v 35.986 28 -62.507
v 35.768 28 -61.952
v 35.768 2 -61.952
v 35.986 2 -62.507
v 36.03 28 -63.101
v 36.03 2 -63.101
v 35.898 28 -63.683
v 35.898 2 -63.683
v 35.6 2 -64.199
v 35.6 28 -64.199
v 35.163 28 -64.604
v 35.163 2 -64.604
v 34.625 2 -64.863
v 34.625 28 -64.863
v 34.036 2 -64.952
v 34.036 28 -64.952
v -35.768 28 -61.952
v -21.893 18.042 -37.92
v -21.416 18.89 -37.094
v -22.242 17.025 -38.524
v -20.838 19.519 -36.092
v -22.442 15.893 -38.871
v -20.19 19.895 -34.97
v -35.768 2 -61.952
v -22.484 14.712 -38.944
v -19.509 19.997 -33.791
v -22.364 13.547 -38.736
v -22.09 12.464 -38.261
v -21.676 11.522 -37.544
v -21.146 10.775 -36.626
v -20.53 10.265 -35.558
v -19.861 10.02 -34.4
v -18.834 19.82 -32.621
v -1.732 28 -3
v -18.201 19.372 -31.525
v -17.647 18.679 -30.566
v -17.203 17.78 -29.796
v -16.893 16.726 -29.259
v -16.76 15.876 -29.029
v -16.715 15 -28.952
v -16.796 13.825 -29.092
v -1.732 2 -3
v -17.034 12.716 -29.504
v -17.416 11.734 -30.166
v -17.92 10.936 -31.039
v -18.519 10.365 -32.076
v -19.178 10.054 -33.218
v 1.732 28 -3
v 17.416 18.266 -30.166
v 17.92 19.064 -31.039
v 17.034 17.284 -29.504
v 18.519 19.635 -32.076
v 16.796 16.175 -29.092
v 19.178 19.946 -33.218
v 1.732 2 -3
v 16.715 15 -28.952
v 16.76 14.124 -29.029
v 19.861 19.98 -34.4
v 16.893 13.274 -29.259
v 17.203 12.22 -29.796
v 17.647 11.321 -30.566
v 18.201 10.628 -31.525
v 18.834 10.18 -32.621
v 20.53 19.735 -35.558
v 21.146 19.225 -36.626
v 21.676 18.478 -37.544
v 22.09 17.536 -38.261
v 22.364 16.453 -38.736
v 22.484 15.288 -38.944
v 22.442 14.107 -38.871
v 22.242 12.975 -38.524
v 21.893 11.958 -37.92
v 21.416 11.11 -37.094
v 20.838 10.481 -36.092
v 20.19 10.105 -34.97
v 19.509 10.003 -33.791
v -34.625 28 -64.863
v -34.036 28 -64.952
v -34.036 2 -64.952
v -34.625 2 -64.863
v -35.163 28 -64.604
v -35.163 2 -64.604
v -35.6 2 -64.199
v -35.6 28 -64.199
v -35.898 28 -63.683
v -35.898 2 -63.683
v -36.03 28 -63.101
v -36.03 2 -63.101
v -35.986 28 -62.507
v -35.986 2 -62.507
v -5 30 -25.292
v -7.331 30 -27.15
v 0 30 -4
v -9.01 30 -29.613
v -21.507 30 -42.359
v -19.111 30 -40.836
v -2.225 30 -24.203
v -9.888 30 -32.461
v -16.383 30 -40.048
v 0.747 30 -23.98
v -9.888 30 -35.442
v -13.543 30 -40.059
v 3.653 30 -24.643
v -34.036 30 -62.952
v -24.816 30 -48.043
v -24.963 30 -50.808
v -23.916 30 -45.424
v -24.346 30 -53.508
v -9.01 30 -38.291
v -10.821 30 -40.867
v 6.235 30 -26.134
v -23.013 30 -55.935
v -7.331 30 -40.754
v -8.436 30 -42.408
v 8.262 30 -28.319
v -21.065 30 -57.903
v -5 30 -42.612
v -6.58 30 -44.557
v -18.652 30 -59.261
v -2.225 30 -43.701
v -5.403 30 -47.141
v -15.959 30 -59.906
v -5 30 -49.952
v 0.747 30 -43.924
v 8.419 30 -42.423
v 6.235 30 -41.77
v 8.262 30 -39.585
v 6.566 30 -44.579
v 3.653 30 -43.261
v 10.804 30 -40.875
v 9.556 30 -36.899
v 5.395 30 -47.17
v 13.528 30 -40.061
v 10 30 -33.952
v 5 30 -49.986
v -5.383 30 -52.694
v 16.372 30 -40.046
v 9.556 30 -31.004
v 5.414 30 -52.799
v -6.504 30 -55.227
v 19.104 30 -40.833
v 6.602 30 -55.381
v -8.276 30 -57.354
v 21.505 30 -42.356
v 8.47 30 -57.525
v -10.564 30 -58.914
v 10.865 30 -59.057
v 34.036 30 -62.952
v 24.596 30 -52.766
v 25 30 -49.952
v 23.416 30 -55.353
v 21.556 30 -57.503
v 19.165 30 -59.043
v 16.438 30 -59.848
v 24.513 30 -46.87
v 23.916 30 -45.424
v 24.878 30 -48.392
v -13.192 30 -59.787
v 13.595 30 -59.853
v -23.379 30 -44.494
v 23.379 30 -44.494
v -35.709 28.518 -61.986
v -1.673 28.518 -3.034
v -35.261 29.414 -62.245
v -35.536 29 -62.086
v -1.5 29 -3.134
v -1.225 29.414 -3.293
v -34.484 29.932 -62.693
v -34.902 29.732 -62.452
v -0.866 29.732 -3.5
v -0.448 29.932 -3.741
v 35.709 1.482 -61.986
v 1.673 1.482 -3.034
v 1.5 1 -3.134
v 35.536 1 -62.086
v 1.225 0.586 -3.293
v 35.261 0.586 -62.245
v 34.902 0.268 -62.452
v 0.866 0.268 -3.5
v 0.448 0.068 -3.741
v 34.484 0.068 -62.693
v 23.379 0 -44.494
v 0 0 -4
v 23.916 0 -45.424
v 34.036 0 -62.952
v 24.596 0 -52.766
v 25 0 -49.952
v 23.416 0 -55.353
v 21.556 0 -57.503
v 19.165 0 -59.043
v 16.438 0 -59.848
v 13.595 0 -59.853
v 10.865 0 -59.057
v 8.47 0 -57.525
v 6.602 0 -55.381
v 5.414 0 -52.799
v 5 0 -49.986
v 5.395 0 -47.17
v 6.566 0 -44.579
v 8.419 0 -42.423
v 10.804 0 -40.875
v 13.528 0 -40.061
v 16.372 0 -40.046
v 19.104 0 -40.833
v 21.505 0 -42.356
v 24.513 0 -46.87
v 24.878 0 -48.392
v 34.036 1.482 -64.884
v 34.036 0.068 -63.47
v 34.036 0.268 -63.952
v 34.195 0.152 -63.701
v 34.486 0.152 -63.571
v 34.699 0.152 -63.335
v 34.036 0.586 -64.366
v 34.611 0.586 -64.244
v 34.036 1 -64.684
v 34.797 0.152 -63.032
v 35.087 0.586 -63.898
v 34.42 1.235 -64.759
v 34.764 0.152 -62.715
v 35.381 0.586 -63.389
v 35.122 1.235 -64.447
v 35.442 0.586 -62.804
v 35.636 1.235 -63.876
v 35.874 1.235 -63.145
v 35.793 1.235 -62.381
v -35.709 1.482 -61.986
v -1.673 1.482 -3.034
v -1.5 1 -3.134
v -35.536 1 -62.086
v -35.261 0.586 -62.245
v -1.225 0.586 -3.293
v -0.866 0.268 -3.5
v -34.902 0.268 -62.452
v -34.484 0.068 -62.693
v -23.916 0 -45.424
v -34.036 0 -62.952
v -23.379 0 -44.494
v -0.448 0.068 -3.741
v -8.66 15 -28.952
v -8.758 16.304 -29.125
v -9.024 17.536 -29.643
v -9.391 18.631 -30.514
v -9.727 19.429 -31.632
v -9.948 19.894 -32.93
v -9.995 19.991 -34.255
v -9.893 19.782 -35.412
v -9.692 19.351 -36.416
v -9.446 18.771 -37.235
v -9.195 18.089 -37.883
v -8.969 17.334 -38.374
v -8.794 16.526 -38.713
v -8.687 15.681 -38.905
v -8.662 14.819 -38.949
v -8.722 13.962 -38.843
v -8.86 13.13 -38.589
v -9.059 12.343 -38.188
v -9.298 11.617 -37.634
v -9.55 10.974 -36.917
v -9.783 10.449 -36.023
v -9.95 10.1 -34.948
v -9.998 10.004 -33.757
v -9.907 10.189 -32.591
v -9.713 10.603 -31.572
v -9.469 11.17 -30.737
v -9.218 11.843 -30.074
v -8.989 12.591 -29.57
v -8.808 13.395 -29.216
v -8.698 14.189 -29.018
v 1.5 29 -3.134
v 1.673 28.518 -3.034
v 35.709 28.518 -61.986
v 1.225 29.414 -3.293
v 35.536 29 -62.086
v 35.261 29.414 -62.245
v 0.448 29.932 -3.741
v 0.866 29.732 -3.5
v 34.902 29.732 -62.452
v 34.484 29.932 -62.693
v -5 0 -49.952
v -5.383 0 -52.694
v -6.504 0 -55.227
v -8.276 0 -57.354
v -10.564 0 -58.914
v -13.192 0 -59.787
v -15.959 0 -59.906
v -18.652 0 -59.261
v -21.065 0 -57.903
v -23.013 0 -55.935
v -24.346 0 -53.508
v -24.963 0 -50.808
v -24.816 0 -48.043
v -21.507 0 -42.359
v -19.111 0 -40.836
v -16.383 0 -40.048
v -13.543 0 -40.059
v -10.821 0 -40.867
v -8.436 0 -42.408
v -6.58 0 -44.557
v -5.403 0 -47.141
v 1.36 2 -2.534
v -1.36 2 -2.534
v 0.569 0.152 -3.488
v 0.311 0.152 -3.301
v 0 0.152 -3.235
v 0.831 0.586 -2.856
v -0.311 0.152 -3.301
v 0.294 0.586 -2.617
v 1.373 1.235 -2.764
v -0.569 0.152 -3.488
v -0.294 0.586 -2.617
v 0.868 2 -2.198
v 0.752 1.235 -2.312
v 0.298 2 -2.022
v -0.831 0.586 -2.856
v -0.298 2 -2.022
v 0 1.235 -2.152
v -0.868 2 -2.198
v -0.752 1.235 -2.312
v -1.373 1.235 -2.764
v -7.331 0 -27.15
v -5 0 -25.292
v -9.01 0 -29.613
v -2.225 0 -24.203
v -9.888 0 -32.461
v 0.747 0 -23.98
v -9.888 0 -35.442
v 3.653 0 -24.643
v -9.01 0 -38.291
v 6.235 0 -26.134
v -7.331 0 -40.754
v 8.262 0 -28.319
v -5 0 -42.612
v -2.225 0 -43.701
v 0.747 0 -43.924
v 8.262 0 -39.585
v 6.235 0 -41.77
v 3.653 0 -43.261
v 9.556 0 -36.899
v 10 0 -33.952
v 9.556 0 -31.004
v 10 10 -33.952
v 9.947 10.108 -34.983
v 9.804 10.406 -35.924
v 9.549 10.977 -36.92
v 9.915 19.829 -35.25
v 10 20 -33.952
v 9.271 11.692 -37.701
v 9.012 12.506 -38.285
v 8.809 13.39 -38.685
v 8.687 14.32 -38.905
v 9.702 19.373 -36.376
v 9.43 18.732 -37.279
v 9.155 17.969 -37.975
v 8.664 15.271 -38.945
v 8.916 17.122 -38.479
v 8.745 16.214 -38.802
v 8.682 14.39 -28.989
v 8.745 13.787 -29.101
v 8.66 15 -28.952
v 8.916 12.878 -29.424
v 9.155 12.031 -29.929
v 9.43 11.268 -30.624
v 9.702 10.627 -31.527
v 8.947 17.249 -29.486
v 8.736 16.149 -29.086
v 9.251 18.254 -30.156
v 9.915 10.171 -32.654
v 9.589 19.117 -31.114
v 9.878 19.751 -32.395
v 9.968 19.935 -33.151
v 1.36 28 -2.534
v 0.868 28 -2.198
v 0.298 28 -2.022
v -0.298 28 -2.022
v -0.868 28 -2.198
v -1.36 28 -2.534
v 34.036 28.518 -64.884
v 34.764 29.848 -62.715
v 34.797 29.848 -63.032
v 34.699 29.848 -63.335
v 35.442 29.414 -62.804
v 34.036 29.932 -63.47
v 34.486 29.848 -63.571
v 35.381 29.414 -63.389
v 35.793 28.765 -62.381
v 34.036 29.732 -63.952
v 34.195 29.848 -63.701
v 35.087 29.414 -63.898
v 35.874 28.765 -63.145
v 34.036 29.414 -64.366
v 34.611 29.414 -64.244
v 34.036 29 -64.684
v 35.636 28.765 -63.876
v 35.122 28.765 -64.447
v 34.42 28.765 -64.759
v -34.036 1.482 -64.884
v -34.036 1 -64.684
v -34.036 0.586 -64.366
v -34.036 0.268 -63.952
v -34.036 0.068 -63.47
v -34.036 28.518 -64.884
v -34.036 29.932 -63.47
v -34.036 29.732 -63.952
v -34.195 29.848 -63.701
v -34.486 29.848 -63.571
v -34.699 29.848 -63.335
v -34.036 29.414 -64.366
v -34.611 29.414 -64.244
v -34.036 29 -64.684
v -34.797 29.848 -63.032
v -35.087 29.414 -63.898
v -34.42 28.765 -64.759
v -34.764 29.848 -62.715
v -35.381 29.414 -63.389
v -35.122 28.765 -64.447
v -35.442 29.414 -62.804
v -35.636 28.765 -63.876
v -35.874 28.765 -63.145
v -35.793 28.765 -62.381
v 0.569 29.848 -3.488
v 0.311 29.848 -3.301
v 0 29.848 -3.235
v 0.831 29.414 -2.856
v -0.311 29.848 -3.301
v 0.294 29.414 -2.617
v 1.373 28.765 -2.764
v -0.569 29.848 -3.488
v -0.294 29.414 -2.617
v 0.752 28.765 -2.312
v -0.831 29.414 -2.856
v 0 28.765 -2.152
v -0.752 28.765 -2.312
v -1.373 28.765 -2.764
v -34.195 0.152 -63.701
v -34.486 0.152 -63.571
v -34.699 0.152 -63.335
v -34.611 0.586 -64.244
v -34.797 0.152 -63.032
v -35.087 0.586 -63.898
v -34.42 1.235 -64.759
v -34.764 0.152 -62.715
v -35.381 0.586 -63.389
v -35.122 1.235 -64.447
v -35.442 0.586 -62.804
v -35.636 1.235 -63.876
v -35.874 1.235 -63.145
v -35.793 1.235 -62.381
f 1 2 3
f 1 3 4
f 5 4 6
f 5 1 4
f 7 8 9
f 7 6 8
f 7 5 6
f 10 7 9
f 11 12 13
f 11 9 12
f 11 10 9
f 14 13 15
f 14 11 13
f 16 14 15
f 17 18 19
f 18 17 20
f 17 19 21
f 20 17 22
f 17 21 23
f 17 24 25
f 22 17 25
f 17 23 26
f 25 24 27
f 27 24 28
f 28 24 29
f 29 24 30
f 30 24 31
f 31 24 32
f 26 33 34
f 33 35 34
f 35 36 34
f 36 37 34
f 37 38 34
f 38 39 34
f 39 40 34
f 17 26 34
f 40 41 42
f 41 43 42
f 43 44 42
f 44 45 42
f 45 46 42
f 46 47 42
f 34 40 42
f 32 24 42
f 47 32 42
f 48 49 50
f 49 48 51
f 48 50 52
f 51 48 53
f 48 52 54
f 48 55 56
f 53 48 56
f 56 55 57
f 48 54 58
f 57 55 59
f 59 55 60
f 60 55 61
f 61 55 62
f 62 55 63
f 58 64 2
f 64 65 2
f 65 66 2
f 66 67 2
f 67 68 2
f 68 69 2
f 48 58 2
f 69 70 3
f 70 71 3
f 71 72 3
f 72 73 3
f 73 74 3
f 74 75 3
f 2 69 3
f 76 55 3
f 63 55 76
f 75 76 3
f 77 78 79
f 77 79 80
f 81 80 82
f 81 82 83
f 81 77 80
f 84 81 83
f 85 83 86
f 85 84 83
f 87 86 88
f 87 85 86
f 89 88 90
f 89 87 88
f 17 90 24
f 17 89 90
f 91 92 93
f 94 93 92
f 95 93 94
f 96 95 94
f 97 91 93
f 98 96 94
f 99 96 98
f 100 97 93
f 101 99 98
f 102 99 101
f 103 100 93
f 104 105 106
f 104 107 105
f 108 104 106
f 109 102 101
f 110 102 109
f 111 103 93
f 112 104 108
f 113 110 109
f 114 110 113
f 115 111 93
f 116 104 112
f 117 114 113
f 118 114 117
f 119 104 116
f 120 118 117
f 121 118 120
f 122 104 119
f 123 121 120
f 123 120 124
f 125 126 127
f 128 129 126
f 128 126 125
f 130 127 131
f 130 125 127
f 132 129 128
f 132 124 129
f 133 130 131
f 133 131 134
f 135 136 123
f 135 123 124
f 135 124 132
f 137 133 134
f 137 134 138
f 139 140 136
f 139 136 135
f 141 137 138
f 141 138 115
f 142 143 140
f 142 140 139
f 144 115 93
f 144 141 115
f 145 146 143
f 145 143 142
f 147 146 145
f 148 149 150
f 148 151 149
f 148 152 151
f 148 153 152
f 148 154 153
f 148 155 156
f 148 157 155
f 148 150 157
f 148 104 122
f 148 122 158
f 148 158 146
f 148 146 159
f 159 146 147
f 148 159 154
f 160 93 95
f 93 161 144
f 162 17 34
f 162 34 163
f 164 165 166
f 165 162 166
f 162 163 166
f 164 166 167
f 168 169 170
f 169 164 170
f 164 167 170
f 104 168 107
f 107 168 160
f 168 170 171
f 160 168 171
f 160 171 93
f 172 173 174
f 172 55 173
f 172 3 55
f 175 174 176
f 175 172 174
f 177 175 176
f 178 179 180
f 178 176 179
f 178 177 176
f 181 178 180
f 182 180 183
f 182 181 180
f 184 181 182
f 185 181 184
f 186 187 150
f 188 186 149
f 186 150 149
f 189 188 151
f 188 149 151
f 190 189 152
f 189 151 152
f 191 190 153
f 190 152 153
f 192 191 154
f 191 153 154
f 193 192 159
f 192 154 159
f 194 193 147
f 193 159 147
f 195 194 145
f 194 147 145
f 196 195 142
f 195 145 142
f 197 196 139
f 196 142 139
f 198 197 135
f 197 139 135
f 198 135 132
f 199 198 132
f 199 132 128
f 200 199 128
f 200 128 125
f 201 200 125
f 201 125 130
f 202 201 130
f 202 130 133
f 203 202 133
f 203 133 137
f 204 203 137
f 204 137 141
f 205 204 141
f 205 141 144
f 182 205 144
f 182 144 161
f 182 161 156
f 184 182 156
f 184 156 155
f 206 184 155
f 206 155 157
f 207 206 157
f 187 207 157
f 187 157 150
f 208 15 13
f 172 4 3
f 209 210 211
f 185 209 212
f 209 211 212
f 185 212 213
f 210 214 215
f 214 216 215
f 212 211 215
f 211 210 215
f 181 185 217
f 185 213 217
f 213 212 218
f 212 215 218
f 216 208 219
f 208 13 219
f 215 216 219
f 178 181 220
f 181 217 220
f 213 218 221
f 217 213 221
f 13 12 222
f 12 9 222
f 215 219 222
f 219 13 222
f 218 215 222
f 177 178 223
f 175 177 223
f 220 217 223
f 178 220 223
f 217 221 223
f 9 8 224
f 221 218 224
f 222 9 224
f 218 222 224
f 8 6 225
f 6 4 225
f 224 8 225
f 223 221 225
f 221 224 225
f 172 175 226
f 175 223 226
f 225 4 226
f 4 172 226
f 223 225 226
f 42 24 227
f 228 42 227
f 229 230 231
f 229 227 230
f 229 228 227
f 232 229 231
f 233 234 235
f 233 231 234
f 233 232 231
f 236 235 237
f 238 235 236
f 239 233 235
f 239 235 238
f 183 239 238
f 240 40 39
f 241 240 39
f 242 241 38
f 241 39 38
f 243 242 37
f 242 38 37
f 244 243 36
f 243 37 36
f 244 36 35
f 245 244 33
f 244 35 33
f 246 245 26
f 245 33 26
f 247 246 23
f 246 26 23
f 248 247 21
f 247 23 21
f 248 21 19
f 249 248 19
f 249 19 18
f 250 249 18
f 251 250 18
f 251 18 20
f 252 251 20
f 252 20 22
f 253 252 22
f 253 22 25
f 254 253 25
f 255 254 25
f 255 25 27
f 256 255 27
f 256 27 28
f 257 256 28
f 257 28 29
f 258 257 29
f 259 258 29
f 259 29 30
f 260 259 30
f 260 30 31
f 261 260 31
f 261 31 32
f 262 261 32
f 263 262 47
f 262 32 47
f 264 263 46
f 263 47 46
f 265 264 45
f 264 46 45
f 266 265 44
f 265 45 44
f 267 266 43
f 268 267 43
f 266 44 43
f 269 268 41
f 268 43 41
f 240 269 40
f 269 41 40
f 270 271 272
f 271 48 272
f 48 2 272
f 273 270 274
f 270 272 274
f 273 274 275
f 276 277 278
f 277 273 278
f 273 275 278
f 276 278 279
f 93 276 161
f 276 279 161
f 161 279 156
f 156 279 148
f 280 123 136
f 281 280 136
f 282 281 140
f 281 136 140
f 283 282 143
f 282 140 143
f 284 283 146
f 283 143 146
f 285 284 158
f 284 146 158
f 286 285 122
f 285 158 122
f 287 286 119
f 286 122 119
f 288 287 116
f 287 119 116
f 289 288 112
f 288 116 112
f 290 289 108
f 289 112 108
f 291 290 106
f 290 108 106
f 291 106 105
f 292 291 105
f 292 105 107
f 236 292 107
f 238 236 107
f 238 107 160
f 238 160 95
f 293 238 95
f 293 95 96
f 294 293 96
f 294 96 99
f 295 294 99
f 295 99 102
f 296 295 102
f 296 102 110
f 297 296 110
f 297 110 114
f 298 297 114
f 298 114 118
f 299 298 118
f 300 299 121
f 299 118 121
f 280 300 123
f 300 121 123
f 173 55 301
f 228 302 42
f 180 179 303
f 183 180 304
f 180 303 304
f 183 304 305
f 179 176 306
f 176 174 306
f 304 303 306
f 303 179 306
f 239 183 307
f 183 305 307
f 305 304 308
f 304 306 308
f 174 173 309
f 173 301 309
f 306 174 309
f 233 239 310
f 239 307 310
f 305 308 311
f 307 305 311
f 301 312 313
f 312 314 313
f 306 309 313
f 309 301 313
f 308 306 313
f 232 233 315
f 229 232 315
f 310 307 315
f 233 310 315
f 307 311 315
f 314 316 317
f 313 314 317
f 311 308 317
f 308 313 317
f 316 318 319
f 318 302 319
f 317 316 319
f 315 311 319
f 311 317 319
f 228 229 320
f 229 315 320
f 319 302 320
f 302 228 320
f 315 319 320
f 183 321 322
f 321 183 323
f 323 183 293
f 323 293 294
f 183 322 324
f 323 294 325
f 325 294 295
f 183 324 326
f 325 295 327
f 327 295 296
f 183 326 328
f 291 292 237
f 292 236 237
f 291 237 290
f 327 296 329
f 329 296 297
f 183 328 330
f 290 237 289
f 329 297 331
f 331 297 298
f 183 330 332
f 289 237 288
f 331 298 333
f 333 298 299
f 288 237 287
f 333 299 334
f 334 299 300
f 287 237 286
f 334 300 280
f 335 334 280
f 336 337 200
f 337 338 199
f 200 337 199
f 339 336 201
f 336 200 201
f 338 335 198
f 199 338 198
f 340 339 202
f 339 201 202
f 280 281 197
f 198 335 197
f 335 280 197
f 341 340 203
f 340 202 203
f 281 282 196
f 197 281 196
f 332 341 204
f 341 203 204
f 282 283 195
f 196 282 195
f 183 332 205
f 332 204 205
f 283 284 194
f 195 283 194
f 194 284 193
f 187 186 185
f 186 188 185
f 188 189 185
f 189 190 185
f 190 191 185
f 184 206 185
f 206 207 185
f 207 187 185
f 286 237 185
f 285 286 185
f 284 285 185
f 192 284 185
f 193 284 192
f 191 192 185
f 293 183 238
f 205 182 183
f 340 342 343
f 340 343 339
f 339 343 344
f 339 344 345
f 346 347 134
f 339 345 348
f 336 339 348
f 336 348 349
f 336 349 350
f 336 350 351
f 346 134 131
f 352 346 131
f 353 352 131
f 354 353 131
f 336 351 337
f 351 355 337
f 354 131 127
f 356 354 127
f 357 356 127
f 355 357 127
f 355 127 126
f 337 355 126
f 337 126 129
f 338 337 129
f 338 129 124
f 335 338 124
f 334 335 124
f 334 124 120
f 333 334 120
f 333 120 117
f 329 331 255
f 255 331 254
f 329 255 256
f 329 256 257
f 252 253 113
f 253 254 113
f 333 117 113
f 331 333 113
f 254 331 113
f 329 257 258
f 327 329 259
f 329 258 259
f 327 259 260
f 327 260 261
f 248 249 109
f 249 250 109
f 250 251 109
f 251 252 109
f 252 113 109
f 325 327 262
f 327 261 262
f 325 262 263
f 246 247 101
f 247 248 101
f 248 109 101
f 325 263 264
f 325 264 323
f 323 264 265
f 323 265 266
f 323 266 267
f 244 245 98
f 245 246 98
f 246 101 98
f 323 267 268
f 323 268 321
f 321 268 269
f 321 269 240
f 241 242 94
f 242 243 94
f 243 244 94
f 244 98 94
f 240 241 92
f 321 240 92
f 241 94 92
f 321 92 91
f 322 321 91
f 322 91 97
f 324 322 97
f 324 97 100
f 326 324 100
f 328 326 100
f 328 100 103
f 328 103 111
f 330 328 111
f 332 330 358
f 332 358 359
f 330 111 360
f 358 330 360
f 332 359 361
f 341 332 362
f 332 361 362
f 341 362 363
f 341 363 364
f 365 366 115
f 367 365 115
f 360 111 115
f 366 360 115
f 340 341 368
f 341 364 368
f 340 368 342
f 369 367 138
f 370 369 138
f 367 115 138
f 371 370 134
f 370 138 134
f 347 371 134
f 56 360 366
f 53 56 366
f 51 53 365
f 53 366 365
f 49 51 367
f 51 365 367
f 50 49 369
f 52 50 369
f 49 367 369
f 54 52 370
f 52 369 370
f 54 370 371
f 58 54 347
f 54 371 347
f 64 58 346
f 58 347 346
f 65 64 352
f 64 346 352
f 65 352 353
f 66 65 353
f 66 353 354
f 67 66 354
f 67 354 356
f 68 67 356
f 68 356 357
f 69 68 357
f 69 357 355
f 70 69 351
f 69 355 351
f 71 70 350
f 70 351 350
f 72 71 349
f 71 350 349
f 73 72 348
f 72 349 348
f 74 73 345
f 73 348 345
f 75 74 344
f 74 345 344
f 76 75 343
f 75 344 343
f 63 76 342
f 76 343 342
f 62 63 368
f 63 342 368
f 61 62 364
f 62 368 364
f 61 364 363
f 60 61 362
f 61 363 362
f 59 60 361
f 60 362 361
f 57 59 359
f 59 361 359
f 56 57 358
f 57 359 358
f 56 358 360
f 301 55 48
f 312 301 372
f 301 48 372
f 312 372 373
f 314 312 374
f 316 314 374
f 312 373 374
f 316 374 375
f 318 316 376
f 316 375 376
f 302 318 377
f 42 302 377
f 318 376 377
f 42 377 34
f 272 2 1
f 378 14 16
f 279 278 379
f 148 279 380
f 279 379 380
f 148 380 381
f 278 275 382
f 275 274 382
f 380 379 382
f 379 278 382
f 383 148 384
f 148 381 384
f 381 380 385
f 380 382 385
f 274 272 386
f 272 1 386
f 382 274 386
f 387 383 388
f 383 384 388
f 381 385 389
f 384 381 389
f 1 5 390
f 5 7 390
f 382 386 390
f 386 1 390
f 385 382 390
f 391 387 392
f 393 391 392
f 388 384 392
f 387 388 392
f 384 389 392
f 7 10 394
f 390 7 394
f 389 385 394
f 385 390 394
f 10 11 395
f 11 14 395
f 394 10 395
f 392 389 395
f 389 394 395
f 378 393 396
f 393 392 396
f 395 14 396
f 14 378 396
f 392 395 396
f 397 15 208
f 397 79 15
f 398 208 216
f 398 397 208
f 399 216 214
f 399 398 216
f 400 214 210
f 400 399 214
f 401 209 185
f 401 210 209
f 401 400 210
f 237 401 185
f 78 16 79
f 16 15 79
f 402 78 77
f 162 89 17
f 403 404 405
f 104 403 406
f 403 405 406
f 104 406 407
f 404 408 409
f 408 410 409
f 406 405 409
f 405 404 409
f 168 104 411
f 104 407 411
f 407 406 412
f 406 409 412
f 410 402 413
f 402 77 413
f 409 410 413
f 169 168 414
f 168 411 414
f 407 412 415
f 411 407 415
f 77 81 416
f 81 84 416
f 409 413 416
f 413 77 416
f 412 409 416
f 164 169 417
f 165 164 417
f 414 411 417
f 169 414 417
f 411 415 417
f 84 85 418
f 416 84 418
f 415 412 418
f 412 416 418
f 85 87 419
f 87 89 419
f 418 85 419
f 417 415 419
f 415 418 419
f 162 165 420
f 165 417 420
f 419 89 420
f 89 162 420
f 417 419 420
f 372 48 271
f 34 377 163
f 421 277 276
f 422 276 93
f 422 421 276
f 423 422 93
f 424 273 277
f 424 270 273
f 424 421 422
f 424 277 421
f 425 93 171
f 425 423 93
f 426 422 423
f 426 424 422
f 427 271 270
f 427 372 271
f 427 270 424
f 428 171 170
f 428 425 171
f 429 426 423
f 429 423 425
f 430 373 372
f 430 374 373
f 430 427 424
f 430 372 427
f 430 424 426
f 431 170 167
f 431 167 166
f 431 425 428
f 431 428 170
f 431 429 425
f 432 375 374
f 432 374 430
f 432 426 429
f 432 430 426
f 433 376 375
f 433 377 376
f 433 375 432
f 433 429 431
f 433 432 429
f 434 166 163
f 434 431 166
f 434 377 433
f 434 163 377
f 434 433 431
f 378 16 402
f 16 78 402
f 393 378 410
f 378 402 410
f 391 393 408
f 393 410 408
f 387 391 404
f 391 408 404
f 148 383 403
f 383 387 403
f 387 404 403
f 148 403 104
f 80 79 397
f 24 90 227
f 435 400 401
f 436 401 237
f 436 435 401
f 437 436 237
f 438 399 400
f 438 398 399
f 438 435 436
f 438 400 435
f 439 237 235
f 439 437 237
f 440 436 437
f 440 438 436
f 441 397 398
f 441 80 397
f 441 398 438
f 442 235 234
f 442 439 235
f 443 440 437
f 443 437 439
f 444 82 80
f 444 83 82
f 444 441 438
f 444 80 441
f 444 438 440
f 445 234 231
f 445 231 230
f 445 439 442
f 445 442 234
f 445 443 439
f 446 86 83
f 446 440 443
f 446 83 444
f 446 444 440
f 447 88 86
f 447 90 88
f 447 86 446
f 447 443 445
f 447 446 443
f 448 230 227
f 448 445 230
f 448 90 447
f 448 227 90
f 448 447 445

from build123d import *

# Parameters (mm, degrees)
BOSS_EXTRUDE1_DEPTH = 30
FILLET1_R           = 2
SKETCH2_R           = 10
CUT_EXTRUDE3_DEPTH  = 31
SKETCH3_R           = 5
CUT_EXTRUDE4_DEPTH  = 73.07179677


with BuildPart() as part:
    # Sketch1 → Boss-Extrude1 (new body)
    with BuildSketch(Plane(origin=(0, 0, 0), x_dir=(1, 0, 0), z_dir=(0, 1, 0))):
        Polygon((0, 0), (37.5, 64.951905284), (-37.5, 64.951905284), align=None)
    extrude(amount=BOSS_EXTRUDE1_DEPTH)

    # Fillet1
    fillet1_edges = [part.edges().sort_by_distance(p)[0] for p in [
        (0, 30, -64.951905284),
        (0, 0, -64.951905284),
        (-18.75, 30, -32.475952642),
        (18.75, 0, -32.475952642),
        (-18.75, 0, -32.475952642),
        (-37.5, 15, -64.951905284),
        (37.5, 15, -64.951905284),
        (0, 15, 0),
        (18.75, 30, -32.475952642),
    ]]
    fillet(fillet1_edges, radius=FILLET1_R)

    # Sketch2 → Cut-Extrude3 (cut, through all)
    with BuildSketch(Plane(origin=(0, 30, 0), x_dir=(1, 0, 0), z_dir=(0, 1, 0))):
        with Locations((-15, 49.951905284)):
            Circle(SKETCH2_R)
        with Locations((15, 49.951905284)):
            Circle(SKETCH2_R)
        with Locations((0, 33.951905284)):
            Circle(SKETCH2_R)
    extrude(amount=-CUT_EXTRUDE3_DEPTH, mode=Mode.SUBTRACT)

    # Sketch3 → Cut-Extrude4 (cut, through all)
    with BuildSketch(Plane.ZY.offset(36.035898385)):
        with Locations((-33.951905284, 15)):
            Circle(SKETCH3_R)
    extrude(amount=-CUT_EXTRUDE4_DEPTH, mode=Mode.SUBTRACT)


solid = part.part
